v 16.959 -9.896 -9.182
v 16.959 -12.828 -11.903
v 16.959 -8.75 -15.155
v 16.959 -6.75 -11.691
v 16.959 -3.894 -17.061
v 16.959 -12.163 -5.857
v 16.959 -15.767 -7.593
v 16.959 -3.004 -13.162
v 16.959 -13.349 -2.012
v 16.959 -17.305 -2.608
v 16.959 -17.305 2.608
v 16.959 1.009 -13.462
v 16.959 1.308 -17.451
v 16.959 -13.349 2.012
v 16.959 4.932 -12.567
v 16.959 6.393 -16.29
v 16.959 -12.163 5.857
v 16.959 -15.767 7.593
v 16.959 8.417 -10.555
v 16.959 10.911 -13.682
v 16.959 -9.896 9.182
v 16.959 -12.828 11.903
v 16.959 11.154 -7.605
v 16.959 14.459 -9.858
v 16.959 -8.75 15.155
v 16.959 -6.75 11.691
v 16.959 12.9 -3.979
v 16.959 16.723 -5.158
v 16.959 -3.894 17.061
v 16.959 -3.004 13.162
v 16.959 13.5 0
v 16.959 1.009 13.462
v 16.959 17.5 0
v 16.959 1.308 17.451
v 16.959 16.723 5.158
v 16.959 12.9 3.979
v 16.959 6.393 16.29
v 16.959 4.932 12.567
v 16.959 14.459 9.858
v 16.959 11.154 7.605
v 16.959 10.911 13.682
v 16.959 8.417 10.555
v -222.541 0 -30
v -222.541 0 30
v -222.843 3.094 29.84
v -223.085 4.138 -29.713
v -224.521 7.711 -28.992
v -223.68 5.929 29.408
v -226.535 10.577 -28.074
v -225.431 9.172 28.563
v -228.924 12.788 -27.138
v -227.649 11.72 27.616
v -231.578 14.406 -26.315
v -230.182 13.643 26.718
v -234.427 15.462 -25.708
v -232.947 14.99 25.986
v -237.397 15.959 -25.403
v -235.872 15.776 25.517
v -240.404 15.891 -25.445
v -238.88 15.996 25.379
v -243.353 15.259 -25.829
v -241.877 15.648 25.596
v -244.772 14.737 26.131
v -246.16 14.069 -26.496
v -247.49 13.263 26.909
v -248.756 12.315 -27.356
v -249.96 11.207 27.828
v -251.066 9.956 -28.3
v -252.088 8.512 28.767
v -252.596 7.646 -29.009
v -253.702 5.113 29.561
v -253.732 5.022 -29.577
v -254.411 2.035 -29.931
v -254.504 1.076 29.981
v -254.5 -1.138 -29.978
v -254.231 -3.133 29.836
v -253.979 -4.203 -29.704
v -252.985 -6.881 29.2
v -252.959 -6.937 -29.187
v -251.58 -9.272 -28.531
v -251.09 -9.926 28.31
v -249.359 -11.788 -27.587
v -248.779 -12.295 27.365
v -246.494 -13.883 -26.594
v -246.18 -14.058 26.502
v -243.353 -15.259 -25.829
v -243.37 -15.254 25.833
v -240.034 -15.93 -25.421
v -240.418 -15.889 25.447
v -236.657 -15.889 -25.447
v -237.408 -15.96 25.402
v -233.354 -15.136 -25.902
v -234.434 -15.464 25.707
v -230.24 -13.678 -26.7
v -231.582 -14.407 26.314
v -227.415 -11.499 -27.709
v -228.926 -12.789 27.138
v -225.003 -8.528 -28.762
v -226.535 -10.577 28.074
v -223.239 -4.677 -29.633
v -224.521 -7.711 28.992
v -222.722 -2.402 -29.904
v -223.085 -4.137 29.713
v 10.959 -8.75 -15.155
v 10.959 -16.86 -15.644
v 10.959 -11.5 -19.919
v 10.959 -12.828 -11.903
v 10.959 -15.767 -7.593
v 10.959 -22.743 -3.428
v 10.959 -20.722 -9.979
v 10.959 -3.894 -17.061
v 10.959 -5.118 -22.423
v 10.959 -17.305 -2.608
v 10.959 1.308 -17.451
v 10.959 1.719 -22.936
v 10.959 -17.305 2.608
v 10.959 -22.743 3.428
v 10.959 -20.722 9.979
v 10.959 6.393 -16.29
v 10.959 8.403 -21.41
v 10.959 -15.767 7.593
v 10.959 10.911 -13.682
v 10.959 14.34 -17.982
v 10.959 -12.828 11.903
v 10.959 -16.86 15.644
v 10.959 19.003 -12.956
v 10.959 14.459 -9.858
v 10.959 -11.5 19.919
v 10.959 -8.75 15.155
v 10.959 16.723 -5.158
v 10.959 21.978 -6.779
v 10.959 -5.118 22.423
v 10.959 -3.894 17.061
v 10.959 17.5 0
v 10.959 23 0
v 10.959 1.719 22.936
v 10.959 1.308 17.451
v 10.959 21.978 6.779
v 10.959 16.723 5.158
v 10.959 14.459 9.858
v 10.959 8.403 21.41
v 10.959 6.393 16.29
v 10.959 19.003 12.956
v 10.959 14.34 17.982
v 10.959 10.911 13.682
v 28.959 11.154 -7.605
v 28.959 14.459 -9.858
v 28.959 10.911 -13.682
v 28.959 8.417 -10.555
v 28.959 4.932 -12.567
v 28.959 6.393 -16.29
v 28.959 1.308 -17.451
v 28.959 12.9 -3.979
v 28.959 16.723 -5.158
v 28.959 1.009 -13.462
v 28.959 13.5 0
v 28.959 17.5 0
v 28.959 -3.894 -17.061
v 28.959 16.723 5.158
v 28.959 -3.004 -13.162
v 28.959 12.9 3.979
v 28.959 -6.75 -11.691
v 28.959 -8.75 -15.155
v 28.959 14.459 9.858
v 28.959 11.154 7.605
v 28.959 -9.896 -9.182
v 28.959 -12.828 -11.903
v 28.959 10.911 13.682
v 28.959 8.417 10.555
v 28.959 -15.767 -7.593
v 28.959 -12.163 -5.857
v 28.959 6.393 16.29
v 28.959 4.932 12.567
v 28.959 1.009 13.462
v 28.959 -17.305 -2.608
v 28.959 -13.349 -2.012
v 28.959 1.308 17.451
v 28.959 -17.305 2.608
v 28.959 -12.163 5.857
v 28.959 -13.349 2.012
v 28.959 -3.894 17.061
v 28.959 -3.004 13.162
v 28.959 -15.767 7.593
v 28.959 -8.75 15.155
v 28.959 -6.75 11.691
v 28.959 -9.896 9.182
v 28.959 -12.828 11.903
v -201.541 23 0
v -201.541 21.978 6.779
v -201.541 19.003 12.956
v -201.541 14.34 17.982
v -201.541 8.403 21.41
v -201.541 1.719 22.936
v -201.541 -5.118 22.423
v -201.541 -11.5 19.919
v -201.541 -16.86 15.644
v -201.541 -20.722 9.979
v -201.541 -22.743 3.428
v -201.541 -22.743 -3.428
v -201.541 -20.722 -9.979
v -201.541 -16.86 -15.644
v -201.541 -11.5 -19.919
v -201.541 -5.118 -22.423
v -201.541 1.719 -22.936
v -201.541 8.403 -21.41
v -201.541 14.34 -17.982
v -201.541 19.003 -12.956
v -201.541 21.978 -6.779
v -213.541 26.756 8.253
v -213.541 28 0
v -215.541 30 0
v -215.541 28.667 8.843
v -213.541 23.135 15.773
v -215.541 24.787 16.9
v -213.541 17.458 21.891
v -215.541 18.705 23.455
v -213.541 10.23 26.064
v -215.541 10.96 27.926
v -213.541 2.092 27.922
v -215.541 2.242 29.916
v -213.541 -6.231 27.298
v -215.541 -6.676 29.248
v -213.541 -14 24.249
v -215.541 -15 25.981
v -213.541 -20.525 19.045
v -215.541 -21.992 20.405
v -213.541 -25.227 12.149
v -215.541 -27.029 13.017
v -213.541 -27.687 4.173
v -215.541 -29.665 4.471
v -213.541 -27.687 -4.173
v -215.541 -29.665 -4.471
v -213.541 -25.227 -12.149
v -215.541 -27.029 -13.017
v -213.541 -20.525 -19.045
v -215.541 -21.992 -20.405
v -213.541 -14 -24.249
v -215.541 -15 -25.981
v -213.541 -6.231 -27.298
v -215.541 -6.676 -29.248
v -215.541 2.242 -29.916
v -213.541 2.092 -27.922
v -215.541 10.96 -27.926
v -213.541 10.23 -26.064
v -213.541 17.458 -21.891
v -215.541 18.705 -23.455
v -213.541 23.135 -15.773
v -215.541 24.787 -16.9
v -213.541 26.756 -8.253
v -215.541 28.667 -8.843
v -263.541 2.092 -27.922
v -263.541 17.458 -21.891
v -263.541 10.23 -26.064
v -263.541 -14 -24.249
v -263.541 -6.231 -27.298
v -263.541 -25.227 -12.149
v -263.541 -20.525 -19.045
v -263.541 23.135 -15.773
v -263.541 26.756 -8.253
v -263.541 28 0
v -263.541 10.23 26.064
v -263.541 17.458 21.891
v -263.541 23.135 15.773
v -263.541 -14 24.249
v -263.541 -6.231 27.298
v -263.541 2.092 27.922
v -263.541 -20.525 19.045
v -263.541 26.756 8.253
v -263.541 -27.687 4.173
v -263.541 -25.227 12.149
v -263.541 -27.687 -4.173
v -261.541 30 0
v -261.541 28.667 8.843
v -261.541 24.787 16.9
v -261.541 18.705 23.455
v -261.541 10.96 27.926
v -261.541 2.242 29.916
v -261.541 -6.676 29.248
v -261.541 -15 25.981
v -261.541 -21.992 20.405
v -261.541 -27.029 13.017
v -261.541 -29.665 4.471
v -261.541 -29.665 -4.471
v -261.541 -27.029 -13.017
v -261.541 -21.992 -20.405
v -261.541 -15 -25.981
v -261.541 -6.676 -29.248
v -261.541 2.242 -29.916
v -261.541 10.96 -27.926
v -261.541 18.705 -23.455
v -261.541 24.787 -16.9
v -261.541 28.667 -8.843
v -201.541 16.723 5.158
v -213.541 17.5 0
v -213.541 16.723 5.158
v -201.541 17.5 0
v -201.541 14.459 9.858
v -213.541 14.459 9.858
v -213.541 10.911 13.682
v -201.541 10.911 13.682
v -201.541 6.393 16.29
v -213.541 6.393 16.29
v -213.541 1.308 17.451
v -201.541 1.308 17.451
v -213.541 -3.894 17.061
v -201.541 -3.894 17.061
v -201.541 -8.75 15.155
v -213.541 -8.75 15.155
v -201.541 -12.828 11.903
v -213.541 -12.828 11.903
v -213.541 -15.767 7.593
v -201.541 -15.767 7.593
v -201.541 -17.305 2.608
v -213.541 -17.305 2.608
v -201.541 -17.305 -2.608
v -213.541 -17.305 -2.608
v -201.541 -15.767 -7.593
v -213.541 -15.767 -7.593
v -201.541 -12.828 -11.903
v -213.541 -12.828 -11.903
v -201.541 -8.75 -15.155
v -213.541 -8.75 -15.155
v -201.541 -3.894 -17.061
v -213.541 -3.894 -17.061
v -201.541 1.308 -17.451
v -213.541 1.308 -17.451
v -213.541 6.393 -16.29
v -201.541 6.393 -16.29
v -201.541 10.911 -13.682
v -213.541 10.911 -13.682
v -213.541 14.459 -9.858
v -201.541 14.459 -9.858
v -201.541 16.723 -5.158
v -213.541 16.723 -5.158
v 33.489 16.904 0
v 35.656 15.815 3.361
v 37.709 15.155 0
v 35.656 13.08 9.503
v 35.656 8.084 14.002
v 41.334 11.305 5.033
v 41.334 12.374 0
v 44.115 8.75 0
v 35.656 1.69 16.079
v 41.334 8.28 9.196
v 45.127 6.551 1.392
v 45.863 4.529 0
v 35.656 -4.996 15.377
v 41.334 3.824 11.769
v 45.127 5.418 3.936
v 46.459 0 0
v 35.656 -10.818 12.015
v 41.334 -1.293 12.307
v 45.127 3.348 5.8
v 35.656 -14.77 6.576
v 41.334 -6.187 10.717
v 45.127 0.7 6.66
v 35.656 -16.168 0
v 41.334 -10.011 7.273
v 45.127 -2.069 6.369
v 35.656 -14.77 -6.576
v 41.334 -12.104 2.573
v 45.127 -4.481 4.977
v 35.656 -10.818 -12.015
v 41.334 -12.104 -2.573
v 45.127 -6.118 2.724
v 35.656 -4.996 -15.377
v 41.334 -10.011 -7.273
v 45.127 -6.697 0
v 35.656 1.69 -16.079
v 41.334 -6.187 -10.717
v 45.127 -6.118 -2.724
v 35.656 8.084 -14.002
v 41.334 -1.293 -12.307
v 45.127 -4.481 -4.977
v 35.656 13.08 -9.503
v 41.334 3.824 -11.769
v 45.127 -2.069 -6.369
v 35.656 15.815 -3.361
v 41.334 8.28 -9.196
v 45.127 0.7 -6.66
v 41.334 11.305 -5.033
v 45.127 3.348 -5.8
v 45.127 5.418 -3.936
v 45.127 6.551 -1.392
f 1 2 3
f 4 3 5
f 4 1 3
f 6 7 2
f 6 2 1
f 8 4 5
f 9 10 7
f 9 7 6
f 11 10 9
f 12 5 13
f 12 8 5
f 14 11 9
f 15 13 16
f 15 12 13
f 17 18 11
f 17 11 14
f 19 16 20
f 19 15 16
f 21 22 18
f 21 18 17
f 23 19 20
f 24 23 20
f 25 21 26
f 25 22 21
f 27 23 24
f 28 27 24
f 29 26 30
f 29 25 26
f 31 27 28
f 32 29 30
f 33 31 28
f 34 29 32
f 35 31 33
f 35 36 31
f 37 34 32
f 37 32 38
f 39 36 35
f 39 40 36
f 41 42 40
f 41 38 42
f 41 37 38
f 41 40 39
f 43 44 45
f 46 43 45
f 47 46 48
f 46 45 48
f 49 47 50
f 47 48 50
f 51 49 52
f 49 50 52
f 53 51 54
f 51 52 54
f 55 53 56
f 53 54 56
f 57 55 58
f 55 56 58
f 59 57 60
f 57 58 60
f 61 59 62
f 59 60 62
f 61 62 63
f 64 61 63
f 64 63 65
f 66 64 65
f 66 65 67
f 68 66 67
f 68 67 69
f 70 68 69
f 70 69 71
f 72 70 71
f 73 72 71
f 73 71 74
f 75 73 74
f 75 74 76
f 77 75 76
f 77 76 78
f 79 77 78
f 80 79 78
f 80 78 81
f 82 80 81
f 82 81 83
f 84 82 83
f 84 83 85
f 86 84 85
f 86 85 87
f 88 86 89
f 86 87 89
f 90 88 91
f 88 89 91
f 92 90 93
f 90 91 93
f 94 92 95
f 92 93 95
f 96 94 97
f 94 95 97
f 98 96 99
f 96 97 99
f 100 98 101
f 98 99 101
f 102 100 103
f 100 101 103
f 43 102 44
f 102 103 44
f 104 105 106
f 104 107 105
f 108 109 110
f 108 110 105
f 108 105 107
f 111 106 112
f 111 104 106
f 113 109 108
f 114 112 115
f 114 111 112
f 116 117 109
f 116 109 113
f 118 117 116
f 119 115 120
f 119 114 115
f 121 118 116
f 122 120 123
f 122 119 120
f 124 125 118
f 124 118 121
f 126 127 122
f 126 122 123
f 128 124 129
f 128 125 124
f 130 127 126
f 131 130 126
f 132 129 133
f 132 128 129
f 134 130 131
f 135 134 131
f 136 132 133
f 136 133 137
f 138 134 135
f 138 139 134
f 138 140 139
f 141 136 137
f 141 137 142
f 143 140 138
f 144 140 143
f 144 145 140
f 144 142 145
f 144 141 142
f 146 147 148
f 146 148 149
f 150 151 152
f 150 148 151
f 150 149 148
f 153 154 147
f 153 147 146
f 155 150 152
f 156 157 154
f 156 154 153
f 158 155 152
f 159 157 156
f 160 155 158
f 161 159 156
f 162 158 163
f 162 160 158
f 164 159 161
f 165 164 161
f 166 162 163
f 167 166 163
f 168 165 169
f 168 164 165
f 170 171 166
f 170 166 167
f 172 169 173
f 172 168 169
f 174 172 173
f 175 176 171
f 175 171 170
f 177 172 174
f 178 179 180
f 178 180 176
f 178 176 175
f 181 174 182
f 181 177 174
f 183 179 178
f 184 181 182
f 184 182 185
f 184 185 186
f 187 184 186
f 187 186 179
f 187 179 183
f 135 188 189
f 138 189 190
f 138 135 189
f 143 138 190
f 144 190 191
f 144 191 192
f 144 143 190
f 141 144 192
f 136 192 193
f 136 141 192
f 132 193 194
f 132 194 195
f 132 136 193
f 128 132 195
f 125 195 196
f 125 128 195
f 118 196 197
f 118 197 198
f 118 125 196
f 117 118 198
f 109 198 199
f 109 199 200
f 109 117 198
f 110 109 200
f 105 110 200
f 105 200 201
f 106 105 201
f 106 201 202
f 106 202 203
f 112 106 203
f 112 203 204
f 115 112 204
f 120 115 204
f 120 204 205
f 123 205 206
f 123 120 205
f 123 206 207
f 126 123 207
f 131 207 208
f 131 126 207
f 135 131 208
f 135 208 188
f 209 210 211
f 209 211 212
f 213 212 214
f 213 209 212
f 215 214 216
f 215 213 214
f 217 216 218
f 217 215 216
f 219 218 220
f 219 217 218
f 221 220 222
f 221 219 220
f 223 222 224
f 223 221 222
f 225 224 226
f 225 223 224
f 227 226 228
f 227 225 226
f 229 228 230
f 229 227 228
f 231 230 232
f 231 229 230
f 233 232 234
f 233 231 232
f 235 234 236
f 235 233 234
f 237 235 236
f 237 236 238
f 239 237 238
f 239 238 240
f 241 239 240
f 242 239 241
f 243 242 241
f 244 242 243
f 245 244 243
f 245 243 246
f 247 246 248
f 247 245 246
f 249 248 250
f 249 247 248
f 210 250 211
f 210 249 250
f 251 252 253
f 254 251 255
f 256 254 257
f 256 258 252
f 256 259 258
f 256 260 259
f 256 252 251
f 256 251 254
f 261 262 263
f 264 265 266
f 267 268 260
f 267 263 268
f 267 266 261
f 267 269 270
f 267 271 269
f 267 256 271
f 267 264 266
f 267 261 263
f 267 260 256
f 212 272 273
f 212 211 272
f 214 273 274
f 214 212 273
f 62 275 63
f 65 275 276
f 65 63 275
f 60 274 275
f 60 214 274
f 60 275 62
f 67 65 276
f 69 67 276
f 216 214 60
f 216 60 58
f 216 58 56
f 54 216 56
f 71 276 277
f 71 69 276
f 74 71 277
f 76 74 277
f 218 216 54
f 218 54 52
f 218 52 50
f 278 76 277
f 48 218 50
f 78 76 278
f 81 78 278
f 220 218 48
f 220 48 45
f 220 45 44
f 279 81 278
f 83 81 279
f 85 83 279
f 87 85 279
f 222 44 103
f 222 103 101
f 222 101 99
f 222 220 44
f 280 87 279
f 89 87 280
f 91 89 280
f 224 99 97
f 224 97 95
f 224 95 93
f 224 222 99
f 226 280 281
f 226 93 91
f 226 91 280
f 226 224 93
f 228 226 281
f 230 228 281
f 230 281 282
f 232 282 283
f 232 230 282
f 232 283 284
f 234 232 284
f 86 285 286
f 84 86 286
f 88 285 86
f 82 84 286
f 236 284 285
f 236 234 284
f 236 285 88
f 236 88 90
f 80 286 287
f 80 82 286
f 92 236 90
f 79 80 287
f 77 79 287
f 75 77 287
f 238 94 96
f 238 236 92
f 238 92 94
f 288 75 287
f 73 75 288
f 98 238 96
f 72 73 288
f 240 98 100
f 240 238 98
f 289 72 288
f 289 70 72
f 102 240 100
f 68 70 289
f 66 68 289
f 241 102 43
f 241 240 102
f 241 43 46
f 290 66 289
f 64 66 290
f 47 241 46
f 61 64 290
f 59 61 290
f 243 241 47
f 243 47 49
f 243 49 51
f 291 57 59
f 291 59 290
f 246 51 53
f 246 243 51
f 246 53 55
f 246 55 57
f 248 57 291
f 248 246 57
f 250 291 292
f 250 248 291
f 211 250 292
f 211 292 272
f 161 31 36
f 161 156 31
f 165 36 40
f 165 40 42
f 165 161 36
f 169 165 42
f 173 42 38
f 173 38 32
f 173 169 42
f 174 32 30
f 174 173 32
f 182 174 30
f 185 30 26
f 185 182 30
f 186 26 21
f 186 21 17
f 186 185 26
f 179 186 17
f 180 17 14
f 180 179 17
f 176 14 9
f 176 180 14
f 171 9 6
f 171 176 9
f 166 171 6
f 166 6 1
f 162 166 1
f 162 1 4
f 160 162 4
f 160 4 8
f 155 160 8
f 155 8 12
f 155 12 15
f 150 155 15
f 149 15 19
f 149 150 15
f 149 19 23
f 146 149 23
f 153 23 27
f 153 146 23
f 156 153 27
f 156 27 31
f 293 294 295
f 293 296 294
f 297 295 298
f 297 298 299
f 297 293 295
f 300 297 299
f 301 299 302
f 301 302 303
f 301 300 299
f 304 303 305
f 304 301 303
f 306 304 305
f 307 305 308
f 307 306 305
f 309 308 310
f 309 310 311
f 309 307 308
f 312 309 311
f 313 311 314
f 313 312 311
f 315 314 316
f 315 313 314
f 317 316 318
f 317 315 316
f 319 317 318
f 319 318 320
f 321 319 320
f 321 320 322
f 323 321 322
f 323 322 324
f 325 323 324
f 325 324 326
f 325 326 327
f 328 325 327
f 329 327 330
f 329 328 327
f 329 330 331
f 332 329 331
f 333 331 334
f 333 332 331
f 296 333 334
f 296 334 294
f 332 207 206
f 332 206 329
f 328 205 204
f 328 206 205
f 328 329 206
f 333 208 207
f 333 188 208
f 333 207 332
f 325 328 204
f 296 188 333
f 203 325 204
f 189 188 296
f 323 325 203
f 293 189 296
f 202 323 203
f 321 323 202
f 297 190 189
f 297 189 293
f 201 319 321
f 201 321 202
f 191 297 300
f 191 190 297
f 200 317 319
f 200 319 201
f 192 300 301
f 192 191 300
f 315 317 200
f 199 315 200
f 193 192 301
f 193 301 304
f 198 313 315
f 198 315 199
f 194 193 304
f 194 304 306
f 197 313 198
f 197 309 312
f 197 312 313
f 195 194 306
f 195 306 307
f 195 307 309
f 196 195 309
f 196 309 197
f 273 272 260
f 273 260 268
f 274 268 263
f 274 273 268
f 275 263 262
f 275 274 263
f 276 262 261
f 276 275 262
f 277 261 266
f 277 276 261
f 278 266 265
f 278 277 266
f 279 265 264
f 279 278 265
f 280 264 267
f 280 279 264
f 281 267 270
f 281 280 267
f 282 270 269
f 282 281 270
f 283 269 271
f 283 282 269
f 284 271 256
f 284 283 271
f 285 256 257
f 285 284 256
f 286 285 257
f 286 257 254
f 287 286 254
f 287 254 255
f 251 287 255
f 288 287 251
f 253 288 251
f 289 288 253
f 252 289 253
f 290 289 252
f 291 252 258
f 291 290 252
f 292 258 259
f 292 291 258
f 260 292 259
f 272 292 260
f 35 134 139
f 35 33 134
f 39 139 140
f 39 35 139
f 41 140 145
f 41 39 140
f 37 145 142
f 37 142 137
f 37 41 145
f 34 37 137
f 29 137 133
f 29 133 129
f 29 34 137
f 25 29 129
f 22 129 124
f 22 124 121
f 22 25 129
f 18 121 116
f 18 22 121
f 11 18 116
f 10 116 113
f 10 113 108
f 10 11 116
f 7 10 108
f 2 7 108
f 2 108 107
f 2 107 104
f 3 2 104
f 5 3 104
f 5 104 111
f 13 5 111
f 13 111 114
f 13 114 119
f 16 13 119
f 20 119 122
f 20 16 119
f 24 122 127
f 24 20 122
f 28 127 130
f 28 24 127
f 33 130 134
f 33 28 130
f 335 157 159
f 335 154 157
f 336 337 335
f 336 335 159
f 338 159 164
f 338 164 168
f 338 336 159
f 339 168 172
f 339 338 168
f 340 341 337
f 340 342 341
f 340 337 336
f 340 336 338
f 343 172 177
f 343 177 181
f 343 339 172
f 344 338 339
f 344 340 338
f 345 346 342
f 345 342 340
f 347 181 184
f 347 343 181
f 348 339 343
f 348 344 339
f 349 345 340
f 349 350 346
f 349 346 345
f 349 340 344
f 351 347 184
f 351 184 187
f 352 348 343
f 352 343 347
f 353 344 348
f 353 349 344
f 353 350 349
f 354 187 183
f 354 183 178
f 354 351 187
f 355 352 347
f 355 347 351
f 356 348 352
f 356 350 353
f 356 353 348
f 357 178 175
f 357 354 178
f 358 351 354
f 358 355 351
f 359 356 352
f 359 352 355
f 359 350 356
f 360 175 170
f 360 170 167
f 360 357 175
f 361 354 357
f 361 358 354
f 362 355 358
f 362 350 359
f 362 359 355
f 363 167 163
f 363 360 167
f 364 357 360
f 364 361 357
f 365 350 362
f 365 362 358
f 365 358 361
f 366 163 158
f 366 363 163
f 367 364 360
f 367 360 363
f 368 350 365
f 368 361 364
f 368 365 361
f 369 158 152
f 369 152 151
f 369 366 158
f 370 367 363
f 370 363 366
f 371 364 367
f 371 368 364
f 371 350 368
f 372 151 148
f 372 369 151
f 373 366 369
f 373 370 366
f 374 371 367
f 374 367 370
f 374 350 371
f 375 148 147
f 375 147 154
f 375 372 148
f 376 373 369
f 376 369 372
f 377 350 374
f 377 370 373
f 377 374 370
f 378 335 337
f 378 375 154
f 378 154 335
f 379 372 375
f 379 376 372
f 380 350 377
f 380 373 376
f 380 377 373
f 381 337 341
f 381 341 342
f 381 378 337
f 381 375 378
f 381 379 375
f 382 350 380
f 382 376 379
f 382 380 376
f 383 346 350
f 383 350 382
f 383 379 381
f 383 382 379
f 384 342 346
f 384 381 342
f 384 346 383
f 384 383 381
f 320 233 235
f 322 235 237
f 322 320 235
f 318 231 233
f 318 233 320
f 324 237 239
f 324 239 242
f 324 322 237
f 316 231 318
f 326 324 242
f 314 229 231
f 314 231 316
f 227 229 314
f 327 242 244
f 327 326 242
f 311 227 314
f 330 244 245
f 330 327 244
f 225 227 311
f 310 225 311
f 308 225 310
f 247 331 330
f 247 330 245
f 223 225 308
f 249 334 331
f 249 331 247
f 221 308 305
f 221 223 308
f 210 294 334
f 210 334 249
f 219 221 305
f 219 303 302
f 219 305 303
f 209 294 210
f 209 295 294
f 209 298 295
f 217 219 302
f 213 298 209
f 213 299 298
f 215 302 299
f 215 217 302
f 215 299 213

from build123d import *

# Parameters (mm, degrees)
CHAMFER1_SIZE      = 2
SKETCH5_R          = 16
CUT_EXTRUDE2_DEPTH = 61


with BuildPart() as part:
    # Sketch1 → Revolve1 (revolve)
    with BuildSketch(Plane.XY):
        with BuildLine():
            Line((-263.540634281, 0), (-263.540634281, 30))
            Line((-263.540634281, 30), (-213.540634281, 30))
            Line((-213.540634281, 30), (-213.540634281, 17.5))
            Line((-213.540634281, 17.5), (-201.540634281, 17.5))
            Line((-201.540634281, 17.5), (-201.540634281, 23))
            Line((-201.540634281, 23), (10.959365719, 23))
            Line((10.959365719, 23), (10.959365719, 17.5))
            Line((10.959365719, 17.5), (16.959365719, 17.5))
            Line((16.959365719, 17.5), (16.959365719, 13.5))
            Line((16.959365719, 13.5), (28.959365719, 13.5))
            Line((28.959365719, 13.5), (28.959365719, 17.5))
            ThreePointArc((28.959365719, 17.5), (41.333734389, 12.374368671), (46.459365719, 0))
            Line((46.459365719, 0), (-263.540634281, 0))
        make_face()
    revolve(axis=Axis((-145.227257267, 0, 0), (1, 0, 0)))

    # Chamfer1
    chamfer1_edges = [part.edges().sort_by_distance(p)[0] for p in [
        (-213.540634281, -30, 0),
        (-263.540634281, -30, 0),
    ]]
    chamfer(chamfer1_edges, length=CHAMFER1_SIZE)

    # Sketch5 → Cut-Extrude2 (cut, through all)
    with BuildSketch(Plane.XY.offset(30)):
        with Locations((-238.540634281, 0)):
            Circle(SKETCH5_R)
    extrude(amount=-CUT_EXTRUDE2_DEPTH, mode=Mode.SUBTRACT)


solid = part.part
